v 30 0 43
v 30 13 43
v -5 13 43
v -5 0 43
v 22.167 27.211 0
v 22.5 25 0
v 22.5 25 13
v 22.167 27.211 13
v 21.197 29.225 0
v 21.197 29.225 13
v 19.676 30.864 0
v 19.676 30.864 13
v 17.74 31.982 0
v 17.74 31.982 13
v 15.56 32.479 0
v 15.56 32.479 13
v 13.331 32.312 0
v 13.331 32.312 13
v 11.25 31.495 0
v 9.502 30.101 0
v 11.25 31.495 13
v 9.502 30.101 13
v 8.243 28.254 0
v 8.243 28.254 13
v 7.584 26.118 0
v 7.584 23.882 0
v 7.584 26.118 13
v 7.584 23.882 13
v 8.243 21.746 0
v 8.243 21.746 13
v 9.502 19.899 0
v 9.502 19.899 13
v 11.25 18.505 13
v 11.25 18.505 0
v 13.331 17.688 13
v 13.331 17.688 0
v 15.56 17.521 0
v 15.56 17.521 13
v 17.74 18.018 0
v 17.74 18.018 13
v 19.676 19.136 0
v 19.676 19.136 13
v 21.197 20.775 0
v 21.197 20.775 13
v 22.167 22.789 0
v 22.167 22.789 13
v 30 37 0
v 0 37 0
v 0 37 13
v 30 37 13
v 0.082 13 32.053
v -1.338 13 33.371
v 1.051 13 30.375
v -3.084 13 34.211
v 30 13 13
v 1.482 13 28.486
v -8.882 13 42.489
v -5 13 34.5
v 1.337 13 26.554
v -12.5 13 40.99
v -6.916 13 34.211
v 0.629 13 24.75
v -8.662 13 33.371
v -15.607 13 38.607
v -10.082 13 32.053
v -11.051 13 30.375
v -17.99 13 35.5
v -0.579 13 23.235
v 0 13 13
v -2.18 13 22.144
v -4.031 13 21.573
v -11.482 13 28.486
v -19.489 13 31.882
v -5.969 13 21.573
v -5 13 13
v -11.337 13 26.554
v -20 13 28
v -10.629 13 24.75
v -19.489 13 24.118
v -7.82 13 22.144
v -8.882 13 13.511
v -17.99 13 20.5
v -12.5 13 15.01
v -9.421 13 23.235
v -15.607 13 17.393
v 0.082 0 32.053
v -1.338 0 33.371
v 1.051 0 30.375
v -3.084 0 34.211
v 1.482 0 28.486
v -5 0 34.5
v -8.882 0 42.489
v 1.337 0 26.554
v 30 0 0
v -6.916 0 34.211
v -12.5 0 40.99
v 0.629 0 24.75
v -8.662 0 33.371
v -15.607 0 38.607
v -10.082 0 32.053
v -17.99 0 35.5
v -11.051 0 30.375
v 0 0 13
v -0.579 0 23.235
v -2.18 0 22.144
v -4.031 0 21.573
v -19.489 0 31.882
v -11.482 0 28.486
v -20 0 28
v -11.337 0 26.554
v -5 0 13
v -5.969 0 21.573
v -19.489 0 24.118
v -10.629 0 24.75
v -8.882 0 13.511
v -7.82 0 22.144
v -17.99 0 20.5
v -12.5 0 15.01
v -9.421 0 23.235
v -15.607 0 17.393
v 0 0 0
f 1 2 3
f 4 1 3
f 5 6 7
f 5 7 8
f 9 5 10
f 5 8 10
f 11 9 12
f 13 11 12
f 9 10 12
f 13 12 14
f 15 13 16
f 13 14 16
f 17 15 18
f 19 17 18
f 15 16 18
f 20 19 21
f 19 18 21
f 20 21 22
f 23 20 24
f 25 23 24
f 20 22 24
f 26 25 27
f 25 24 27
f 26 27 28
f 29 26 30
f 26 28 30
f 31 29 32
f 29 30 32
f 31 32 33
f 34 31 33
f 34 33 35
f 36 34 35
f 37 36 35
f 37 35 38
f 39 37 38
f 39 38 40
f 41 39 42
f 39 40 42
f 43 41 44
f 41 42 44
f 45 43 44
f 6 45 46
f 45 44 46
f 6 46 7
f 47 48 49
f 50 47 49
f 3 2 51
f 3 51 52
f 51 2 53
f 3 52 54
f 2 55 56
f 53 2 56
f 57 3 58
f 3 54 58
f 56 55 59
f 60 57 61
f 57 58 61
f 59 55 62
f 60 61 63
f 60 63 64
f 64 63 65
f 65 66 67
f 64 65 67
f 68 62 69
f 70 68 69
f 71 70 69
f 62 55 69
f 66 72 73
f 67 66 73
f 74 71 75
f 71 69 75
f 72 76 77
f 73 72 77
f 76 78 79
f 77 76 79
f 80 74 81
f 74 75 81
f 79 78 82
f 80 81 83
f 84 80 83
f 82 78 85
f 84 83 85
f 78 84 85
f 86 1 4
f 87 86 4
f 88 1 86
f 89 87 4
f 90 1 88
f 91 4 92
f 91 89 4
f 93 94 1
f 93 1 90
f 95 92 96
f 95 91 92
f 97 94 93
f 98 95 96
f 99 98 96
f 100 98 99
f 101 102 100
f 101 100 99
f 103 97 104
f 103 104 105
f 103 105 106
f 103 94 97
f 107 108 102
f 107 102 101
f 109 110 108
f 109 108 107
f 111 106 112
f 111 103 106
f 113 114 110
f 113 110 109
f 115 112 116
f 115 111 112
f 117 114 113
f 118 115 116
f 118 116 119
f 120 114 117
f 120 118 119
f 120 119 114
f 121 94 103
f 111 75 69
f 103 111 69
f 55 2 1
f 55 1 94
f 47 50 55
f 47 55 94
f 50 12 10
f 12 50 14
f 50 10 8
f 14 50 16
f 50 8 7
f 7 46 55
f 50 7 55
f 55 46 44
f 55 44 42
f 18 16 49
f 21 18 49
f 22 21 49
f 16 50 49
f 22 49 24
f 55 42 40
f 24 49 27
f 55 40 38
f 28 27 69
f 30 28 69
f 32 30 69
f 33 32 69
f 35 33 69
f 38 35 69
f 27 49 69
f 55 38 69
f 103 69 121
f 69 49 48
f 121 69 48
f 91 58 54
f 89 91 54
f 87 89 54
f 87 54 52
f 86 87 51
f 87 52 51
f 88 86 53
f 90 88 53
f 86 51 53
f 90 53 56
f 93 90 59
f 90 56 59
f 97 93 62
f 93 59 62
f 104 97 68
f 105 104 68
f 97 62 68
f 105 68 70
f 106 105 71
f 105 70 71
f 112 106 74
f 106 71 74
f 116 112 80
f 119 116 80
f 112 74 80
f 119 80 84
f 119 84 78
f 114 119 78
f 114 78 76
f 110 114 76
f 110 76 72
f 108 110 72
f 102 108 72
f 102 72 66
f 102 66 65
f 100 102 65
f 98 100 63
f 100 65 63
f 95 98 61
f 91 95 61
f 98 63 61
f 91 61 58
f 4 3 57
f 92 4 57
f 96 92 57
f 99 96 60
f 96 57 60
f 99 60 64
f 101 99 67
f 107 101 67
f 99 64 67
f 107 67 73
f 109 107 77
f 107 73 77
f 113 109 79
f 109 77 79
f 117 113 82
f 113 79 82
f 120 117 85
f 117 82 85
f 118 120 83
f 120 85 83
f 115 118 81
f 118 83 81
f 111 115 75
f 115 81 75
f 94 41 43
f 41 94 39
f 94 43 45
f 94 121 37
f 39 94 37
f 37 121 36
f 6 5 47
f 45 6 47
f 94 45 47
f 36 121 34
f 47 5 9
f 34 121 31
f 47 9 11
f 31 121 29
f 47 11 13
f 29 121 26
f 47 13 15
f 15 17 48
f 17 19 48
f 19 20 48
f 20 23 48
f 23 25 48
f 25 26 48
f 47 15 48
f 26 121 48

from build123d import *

# Parameters (mm, degrees)
BOSS_EXTRUDE3_DEPTH = 30
BOSS_EXTRUDE5_DEPTH = 13
SKETCH6_R           = 6.5
CUT_EXTRUDE1_DEPTH  = 13
SKETCH7_R           = 7.5
CUT_EXTRUDE2_DEPTH  = 13


with BuildPart() as part:
    # Sketch2 → Boss-Extrude3 (new body)
    with BuildSketch(Plane(origin=(0, 0, 0), x_dir=(0, 0, -1), z_dir=(1, 0, 0))):
        Polygon((0, 0), (0, 37), (-13, 37), (-13, 13), (-43, 13), (-43, 0), align=None)
    extrude(amount=BOSS_EXTRUDE3_DEPTH)

    # Sketch4 → Boss-Extrude5 (add)
    with BuildSketch(Plane(origin=(0, 13, 0), x_dir=(1, 0, 0), z_dir=(0, 1, 0))):
        with BuildLine():
            Line((0, -13), (0, -43))
            Line((0, -43), (-5, -43))
            ThreePointArc((-5, -43), (-20, -28), (-5, -13))
            Line((-5, -13), (0, -13))
        make_face()
    extrude(amount=-BOSS_EXTRUDE5_DEPTH)

    # Sketch6 → Cut-Extrude1 (cut)
    with BuildSketch(Plane(origin=(0, 13, 0), x_dir=(1, 0, 0), z_dir=(0, 1, 0))):
        with Locations(Location((-5, -28, 0), (0, 0, 270))):
            Circle(SKETCH6_R)
    extrude(amount=-CUT_EXTRUDE1_DEPTH, mode=Mode.SUBTRACT)

    # Sketch7 → Cut-Extrude2 (cut)
    with BuildSketch(Plane.XY.offset(13)):
        with Locations((15, 25)):
            Circle(SKETCH7_R)
    extrude(amount=-CUT_EXTRUDE2_DEPTH, mode=Mode.SUBTRACT)


solid = part.part
